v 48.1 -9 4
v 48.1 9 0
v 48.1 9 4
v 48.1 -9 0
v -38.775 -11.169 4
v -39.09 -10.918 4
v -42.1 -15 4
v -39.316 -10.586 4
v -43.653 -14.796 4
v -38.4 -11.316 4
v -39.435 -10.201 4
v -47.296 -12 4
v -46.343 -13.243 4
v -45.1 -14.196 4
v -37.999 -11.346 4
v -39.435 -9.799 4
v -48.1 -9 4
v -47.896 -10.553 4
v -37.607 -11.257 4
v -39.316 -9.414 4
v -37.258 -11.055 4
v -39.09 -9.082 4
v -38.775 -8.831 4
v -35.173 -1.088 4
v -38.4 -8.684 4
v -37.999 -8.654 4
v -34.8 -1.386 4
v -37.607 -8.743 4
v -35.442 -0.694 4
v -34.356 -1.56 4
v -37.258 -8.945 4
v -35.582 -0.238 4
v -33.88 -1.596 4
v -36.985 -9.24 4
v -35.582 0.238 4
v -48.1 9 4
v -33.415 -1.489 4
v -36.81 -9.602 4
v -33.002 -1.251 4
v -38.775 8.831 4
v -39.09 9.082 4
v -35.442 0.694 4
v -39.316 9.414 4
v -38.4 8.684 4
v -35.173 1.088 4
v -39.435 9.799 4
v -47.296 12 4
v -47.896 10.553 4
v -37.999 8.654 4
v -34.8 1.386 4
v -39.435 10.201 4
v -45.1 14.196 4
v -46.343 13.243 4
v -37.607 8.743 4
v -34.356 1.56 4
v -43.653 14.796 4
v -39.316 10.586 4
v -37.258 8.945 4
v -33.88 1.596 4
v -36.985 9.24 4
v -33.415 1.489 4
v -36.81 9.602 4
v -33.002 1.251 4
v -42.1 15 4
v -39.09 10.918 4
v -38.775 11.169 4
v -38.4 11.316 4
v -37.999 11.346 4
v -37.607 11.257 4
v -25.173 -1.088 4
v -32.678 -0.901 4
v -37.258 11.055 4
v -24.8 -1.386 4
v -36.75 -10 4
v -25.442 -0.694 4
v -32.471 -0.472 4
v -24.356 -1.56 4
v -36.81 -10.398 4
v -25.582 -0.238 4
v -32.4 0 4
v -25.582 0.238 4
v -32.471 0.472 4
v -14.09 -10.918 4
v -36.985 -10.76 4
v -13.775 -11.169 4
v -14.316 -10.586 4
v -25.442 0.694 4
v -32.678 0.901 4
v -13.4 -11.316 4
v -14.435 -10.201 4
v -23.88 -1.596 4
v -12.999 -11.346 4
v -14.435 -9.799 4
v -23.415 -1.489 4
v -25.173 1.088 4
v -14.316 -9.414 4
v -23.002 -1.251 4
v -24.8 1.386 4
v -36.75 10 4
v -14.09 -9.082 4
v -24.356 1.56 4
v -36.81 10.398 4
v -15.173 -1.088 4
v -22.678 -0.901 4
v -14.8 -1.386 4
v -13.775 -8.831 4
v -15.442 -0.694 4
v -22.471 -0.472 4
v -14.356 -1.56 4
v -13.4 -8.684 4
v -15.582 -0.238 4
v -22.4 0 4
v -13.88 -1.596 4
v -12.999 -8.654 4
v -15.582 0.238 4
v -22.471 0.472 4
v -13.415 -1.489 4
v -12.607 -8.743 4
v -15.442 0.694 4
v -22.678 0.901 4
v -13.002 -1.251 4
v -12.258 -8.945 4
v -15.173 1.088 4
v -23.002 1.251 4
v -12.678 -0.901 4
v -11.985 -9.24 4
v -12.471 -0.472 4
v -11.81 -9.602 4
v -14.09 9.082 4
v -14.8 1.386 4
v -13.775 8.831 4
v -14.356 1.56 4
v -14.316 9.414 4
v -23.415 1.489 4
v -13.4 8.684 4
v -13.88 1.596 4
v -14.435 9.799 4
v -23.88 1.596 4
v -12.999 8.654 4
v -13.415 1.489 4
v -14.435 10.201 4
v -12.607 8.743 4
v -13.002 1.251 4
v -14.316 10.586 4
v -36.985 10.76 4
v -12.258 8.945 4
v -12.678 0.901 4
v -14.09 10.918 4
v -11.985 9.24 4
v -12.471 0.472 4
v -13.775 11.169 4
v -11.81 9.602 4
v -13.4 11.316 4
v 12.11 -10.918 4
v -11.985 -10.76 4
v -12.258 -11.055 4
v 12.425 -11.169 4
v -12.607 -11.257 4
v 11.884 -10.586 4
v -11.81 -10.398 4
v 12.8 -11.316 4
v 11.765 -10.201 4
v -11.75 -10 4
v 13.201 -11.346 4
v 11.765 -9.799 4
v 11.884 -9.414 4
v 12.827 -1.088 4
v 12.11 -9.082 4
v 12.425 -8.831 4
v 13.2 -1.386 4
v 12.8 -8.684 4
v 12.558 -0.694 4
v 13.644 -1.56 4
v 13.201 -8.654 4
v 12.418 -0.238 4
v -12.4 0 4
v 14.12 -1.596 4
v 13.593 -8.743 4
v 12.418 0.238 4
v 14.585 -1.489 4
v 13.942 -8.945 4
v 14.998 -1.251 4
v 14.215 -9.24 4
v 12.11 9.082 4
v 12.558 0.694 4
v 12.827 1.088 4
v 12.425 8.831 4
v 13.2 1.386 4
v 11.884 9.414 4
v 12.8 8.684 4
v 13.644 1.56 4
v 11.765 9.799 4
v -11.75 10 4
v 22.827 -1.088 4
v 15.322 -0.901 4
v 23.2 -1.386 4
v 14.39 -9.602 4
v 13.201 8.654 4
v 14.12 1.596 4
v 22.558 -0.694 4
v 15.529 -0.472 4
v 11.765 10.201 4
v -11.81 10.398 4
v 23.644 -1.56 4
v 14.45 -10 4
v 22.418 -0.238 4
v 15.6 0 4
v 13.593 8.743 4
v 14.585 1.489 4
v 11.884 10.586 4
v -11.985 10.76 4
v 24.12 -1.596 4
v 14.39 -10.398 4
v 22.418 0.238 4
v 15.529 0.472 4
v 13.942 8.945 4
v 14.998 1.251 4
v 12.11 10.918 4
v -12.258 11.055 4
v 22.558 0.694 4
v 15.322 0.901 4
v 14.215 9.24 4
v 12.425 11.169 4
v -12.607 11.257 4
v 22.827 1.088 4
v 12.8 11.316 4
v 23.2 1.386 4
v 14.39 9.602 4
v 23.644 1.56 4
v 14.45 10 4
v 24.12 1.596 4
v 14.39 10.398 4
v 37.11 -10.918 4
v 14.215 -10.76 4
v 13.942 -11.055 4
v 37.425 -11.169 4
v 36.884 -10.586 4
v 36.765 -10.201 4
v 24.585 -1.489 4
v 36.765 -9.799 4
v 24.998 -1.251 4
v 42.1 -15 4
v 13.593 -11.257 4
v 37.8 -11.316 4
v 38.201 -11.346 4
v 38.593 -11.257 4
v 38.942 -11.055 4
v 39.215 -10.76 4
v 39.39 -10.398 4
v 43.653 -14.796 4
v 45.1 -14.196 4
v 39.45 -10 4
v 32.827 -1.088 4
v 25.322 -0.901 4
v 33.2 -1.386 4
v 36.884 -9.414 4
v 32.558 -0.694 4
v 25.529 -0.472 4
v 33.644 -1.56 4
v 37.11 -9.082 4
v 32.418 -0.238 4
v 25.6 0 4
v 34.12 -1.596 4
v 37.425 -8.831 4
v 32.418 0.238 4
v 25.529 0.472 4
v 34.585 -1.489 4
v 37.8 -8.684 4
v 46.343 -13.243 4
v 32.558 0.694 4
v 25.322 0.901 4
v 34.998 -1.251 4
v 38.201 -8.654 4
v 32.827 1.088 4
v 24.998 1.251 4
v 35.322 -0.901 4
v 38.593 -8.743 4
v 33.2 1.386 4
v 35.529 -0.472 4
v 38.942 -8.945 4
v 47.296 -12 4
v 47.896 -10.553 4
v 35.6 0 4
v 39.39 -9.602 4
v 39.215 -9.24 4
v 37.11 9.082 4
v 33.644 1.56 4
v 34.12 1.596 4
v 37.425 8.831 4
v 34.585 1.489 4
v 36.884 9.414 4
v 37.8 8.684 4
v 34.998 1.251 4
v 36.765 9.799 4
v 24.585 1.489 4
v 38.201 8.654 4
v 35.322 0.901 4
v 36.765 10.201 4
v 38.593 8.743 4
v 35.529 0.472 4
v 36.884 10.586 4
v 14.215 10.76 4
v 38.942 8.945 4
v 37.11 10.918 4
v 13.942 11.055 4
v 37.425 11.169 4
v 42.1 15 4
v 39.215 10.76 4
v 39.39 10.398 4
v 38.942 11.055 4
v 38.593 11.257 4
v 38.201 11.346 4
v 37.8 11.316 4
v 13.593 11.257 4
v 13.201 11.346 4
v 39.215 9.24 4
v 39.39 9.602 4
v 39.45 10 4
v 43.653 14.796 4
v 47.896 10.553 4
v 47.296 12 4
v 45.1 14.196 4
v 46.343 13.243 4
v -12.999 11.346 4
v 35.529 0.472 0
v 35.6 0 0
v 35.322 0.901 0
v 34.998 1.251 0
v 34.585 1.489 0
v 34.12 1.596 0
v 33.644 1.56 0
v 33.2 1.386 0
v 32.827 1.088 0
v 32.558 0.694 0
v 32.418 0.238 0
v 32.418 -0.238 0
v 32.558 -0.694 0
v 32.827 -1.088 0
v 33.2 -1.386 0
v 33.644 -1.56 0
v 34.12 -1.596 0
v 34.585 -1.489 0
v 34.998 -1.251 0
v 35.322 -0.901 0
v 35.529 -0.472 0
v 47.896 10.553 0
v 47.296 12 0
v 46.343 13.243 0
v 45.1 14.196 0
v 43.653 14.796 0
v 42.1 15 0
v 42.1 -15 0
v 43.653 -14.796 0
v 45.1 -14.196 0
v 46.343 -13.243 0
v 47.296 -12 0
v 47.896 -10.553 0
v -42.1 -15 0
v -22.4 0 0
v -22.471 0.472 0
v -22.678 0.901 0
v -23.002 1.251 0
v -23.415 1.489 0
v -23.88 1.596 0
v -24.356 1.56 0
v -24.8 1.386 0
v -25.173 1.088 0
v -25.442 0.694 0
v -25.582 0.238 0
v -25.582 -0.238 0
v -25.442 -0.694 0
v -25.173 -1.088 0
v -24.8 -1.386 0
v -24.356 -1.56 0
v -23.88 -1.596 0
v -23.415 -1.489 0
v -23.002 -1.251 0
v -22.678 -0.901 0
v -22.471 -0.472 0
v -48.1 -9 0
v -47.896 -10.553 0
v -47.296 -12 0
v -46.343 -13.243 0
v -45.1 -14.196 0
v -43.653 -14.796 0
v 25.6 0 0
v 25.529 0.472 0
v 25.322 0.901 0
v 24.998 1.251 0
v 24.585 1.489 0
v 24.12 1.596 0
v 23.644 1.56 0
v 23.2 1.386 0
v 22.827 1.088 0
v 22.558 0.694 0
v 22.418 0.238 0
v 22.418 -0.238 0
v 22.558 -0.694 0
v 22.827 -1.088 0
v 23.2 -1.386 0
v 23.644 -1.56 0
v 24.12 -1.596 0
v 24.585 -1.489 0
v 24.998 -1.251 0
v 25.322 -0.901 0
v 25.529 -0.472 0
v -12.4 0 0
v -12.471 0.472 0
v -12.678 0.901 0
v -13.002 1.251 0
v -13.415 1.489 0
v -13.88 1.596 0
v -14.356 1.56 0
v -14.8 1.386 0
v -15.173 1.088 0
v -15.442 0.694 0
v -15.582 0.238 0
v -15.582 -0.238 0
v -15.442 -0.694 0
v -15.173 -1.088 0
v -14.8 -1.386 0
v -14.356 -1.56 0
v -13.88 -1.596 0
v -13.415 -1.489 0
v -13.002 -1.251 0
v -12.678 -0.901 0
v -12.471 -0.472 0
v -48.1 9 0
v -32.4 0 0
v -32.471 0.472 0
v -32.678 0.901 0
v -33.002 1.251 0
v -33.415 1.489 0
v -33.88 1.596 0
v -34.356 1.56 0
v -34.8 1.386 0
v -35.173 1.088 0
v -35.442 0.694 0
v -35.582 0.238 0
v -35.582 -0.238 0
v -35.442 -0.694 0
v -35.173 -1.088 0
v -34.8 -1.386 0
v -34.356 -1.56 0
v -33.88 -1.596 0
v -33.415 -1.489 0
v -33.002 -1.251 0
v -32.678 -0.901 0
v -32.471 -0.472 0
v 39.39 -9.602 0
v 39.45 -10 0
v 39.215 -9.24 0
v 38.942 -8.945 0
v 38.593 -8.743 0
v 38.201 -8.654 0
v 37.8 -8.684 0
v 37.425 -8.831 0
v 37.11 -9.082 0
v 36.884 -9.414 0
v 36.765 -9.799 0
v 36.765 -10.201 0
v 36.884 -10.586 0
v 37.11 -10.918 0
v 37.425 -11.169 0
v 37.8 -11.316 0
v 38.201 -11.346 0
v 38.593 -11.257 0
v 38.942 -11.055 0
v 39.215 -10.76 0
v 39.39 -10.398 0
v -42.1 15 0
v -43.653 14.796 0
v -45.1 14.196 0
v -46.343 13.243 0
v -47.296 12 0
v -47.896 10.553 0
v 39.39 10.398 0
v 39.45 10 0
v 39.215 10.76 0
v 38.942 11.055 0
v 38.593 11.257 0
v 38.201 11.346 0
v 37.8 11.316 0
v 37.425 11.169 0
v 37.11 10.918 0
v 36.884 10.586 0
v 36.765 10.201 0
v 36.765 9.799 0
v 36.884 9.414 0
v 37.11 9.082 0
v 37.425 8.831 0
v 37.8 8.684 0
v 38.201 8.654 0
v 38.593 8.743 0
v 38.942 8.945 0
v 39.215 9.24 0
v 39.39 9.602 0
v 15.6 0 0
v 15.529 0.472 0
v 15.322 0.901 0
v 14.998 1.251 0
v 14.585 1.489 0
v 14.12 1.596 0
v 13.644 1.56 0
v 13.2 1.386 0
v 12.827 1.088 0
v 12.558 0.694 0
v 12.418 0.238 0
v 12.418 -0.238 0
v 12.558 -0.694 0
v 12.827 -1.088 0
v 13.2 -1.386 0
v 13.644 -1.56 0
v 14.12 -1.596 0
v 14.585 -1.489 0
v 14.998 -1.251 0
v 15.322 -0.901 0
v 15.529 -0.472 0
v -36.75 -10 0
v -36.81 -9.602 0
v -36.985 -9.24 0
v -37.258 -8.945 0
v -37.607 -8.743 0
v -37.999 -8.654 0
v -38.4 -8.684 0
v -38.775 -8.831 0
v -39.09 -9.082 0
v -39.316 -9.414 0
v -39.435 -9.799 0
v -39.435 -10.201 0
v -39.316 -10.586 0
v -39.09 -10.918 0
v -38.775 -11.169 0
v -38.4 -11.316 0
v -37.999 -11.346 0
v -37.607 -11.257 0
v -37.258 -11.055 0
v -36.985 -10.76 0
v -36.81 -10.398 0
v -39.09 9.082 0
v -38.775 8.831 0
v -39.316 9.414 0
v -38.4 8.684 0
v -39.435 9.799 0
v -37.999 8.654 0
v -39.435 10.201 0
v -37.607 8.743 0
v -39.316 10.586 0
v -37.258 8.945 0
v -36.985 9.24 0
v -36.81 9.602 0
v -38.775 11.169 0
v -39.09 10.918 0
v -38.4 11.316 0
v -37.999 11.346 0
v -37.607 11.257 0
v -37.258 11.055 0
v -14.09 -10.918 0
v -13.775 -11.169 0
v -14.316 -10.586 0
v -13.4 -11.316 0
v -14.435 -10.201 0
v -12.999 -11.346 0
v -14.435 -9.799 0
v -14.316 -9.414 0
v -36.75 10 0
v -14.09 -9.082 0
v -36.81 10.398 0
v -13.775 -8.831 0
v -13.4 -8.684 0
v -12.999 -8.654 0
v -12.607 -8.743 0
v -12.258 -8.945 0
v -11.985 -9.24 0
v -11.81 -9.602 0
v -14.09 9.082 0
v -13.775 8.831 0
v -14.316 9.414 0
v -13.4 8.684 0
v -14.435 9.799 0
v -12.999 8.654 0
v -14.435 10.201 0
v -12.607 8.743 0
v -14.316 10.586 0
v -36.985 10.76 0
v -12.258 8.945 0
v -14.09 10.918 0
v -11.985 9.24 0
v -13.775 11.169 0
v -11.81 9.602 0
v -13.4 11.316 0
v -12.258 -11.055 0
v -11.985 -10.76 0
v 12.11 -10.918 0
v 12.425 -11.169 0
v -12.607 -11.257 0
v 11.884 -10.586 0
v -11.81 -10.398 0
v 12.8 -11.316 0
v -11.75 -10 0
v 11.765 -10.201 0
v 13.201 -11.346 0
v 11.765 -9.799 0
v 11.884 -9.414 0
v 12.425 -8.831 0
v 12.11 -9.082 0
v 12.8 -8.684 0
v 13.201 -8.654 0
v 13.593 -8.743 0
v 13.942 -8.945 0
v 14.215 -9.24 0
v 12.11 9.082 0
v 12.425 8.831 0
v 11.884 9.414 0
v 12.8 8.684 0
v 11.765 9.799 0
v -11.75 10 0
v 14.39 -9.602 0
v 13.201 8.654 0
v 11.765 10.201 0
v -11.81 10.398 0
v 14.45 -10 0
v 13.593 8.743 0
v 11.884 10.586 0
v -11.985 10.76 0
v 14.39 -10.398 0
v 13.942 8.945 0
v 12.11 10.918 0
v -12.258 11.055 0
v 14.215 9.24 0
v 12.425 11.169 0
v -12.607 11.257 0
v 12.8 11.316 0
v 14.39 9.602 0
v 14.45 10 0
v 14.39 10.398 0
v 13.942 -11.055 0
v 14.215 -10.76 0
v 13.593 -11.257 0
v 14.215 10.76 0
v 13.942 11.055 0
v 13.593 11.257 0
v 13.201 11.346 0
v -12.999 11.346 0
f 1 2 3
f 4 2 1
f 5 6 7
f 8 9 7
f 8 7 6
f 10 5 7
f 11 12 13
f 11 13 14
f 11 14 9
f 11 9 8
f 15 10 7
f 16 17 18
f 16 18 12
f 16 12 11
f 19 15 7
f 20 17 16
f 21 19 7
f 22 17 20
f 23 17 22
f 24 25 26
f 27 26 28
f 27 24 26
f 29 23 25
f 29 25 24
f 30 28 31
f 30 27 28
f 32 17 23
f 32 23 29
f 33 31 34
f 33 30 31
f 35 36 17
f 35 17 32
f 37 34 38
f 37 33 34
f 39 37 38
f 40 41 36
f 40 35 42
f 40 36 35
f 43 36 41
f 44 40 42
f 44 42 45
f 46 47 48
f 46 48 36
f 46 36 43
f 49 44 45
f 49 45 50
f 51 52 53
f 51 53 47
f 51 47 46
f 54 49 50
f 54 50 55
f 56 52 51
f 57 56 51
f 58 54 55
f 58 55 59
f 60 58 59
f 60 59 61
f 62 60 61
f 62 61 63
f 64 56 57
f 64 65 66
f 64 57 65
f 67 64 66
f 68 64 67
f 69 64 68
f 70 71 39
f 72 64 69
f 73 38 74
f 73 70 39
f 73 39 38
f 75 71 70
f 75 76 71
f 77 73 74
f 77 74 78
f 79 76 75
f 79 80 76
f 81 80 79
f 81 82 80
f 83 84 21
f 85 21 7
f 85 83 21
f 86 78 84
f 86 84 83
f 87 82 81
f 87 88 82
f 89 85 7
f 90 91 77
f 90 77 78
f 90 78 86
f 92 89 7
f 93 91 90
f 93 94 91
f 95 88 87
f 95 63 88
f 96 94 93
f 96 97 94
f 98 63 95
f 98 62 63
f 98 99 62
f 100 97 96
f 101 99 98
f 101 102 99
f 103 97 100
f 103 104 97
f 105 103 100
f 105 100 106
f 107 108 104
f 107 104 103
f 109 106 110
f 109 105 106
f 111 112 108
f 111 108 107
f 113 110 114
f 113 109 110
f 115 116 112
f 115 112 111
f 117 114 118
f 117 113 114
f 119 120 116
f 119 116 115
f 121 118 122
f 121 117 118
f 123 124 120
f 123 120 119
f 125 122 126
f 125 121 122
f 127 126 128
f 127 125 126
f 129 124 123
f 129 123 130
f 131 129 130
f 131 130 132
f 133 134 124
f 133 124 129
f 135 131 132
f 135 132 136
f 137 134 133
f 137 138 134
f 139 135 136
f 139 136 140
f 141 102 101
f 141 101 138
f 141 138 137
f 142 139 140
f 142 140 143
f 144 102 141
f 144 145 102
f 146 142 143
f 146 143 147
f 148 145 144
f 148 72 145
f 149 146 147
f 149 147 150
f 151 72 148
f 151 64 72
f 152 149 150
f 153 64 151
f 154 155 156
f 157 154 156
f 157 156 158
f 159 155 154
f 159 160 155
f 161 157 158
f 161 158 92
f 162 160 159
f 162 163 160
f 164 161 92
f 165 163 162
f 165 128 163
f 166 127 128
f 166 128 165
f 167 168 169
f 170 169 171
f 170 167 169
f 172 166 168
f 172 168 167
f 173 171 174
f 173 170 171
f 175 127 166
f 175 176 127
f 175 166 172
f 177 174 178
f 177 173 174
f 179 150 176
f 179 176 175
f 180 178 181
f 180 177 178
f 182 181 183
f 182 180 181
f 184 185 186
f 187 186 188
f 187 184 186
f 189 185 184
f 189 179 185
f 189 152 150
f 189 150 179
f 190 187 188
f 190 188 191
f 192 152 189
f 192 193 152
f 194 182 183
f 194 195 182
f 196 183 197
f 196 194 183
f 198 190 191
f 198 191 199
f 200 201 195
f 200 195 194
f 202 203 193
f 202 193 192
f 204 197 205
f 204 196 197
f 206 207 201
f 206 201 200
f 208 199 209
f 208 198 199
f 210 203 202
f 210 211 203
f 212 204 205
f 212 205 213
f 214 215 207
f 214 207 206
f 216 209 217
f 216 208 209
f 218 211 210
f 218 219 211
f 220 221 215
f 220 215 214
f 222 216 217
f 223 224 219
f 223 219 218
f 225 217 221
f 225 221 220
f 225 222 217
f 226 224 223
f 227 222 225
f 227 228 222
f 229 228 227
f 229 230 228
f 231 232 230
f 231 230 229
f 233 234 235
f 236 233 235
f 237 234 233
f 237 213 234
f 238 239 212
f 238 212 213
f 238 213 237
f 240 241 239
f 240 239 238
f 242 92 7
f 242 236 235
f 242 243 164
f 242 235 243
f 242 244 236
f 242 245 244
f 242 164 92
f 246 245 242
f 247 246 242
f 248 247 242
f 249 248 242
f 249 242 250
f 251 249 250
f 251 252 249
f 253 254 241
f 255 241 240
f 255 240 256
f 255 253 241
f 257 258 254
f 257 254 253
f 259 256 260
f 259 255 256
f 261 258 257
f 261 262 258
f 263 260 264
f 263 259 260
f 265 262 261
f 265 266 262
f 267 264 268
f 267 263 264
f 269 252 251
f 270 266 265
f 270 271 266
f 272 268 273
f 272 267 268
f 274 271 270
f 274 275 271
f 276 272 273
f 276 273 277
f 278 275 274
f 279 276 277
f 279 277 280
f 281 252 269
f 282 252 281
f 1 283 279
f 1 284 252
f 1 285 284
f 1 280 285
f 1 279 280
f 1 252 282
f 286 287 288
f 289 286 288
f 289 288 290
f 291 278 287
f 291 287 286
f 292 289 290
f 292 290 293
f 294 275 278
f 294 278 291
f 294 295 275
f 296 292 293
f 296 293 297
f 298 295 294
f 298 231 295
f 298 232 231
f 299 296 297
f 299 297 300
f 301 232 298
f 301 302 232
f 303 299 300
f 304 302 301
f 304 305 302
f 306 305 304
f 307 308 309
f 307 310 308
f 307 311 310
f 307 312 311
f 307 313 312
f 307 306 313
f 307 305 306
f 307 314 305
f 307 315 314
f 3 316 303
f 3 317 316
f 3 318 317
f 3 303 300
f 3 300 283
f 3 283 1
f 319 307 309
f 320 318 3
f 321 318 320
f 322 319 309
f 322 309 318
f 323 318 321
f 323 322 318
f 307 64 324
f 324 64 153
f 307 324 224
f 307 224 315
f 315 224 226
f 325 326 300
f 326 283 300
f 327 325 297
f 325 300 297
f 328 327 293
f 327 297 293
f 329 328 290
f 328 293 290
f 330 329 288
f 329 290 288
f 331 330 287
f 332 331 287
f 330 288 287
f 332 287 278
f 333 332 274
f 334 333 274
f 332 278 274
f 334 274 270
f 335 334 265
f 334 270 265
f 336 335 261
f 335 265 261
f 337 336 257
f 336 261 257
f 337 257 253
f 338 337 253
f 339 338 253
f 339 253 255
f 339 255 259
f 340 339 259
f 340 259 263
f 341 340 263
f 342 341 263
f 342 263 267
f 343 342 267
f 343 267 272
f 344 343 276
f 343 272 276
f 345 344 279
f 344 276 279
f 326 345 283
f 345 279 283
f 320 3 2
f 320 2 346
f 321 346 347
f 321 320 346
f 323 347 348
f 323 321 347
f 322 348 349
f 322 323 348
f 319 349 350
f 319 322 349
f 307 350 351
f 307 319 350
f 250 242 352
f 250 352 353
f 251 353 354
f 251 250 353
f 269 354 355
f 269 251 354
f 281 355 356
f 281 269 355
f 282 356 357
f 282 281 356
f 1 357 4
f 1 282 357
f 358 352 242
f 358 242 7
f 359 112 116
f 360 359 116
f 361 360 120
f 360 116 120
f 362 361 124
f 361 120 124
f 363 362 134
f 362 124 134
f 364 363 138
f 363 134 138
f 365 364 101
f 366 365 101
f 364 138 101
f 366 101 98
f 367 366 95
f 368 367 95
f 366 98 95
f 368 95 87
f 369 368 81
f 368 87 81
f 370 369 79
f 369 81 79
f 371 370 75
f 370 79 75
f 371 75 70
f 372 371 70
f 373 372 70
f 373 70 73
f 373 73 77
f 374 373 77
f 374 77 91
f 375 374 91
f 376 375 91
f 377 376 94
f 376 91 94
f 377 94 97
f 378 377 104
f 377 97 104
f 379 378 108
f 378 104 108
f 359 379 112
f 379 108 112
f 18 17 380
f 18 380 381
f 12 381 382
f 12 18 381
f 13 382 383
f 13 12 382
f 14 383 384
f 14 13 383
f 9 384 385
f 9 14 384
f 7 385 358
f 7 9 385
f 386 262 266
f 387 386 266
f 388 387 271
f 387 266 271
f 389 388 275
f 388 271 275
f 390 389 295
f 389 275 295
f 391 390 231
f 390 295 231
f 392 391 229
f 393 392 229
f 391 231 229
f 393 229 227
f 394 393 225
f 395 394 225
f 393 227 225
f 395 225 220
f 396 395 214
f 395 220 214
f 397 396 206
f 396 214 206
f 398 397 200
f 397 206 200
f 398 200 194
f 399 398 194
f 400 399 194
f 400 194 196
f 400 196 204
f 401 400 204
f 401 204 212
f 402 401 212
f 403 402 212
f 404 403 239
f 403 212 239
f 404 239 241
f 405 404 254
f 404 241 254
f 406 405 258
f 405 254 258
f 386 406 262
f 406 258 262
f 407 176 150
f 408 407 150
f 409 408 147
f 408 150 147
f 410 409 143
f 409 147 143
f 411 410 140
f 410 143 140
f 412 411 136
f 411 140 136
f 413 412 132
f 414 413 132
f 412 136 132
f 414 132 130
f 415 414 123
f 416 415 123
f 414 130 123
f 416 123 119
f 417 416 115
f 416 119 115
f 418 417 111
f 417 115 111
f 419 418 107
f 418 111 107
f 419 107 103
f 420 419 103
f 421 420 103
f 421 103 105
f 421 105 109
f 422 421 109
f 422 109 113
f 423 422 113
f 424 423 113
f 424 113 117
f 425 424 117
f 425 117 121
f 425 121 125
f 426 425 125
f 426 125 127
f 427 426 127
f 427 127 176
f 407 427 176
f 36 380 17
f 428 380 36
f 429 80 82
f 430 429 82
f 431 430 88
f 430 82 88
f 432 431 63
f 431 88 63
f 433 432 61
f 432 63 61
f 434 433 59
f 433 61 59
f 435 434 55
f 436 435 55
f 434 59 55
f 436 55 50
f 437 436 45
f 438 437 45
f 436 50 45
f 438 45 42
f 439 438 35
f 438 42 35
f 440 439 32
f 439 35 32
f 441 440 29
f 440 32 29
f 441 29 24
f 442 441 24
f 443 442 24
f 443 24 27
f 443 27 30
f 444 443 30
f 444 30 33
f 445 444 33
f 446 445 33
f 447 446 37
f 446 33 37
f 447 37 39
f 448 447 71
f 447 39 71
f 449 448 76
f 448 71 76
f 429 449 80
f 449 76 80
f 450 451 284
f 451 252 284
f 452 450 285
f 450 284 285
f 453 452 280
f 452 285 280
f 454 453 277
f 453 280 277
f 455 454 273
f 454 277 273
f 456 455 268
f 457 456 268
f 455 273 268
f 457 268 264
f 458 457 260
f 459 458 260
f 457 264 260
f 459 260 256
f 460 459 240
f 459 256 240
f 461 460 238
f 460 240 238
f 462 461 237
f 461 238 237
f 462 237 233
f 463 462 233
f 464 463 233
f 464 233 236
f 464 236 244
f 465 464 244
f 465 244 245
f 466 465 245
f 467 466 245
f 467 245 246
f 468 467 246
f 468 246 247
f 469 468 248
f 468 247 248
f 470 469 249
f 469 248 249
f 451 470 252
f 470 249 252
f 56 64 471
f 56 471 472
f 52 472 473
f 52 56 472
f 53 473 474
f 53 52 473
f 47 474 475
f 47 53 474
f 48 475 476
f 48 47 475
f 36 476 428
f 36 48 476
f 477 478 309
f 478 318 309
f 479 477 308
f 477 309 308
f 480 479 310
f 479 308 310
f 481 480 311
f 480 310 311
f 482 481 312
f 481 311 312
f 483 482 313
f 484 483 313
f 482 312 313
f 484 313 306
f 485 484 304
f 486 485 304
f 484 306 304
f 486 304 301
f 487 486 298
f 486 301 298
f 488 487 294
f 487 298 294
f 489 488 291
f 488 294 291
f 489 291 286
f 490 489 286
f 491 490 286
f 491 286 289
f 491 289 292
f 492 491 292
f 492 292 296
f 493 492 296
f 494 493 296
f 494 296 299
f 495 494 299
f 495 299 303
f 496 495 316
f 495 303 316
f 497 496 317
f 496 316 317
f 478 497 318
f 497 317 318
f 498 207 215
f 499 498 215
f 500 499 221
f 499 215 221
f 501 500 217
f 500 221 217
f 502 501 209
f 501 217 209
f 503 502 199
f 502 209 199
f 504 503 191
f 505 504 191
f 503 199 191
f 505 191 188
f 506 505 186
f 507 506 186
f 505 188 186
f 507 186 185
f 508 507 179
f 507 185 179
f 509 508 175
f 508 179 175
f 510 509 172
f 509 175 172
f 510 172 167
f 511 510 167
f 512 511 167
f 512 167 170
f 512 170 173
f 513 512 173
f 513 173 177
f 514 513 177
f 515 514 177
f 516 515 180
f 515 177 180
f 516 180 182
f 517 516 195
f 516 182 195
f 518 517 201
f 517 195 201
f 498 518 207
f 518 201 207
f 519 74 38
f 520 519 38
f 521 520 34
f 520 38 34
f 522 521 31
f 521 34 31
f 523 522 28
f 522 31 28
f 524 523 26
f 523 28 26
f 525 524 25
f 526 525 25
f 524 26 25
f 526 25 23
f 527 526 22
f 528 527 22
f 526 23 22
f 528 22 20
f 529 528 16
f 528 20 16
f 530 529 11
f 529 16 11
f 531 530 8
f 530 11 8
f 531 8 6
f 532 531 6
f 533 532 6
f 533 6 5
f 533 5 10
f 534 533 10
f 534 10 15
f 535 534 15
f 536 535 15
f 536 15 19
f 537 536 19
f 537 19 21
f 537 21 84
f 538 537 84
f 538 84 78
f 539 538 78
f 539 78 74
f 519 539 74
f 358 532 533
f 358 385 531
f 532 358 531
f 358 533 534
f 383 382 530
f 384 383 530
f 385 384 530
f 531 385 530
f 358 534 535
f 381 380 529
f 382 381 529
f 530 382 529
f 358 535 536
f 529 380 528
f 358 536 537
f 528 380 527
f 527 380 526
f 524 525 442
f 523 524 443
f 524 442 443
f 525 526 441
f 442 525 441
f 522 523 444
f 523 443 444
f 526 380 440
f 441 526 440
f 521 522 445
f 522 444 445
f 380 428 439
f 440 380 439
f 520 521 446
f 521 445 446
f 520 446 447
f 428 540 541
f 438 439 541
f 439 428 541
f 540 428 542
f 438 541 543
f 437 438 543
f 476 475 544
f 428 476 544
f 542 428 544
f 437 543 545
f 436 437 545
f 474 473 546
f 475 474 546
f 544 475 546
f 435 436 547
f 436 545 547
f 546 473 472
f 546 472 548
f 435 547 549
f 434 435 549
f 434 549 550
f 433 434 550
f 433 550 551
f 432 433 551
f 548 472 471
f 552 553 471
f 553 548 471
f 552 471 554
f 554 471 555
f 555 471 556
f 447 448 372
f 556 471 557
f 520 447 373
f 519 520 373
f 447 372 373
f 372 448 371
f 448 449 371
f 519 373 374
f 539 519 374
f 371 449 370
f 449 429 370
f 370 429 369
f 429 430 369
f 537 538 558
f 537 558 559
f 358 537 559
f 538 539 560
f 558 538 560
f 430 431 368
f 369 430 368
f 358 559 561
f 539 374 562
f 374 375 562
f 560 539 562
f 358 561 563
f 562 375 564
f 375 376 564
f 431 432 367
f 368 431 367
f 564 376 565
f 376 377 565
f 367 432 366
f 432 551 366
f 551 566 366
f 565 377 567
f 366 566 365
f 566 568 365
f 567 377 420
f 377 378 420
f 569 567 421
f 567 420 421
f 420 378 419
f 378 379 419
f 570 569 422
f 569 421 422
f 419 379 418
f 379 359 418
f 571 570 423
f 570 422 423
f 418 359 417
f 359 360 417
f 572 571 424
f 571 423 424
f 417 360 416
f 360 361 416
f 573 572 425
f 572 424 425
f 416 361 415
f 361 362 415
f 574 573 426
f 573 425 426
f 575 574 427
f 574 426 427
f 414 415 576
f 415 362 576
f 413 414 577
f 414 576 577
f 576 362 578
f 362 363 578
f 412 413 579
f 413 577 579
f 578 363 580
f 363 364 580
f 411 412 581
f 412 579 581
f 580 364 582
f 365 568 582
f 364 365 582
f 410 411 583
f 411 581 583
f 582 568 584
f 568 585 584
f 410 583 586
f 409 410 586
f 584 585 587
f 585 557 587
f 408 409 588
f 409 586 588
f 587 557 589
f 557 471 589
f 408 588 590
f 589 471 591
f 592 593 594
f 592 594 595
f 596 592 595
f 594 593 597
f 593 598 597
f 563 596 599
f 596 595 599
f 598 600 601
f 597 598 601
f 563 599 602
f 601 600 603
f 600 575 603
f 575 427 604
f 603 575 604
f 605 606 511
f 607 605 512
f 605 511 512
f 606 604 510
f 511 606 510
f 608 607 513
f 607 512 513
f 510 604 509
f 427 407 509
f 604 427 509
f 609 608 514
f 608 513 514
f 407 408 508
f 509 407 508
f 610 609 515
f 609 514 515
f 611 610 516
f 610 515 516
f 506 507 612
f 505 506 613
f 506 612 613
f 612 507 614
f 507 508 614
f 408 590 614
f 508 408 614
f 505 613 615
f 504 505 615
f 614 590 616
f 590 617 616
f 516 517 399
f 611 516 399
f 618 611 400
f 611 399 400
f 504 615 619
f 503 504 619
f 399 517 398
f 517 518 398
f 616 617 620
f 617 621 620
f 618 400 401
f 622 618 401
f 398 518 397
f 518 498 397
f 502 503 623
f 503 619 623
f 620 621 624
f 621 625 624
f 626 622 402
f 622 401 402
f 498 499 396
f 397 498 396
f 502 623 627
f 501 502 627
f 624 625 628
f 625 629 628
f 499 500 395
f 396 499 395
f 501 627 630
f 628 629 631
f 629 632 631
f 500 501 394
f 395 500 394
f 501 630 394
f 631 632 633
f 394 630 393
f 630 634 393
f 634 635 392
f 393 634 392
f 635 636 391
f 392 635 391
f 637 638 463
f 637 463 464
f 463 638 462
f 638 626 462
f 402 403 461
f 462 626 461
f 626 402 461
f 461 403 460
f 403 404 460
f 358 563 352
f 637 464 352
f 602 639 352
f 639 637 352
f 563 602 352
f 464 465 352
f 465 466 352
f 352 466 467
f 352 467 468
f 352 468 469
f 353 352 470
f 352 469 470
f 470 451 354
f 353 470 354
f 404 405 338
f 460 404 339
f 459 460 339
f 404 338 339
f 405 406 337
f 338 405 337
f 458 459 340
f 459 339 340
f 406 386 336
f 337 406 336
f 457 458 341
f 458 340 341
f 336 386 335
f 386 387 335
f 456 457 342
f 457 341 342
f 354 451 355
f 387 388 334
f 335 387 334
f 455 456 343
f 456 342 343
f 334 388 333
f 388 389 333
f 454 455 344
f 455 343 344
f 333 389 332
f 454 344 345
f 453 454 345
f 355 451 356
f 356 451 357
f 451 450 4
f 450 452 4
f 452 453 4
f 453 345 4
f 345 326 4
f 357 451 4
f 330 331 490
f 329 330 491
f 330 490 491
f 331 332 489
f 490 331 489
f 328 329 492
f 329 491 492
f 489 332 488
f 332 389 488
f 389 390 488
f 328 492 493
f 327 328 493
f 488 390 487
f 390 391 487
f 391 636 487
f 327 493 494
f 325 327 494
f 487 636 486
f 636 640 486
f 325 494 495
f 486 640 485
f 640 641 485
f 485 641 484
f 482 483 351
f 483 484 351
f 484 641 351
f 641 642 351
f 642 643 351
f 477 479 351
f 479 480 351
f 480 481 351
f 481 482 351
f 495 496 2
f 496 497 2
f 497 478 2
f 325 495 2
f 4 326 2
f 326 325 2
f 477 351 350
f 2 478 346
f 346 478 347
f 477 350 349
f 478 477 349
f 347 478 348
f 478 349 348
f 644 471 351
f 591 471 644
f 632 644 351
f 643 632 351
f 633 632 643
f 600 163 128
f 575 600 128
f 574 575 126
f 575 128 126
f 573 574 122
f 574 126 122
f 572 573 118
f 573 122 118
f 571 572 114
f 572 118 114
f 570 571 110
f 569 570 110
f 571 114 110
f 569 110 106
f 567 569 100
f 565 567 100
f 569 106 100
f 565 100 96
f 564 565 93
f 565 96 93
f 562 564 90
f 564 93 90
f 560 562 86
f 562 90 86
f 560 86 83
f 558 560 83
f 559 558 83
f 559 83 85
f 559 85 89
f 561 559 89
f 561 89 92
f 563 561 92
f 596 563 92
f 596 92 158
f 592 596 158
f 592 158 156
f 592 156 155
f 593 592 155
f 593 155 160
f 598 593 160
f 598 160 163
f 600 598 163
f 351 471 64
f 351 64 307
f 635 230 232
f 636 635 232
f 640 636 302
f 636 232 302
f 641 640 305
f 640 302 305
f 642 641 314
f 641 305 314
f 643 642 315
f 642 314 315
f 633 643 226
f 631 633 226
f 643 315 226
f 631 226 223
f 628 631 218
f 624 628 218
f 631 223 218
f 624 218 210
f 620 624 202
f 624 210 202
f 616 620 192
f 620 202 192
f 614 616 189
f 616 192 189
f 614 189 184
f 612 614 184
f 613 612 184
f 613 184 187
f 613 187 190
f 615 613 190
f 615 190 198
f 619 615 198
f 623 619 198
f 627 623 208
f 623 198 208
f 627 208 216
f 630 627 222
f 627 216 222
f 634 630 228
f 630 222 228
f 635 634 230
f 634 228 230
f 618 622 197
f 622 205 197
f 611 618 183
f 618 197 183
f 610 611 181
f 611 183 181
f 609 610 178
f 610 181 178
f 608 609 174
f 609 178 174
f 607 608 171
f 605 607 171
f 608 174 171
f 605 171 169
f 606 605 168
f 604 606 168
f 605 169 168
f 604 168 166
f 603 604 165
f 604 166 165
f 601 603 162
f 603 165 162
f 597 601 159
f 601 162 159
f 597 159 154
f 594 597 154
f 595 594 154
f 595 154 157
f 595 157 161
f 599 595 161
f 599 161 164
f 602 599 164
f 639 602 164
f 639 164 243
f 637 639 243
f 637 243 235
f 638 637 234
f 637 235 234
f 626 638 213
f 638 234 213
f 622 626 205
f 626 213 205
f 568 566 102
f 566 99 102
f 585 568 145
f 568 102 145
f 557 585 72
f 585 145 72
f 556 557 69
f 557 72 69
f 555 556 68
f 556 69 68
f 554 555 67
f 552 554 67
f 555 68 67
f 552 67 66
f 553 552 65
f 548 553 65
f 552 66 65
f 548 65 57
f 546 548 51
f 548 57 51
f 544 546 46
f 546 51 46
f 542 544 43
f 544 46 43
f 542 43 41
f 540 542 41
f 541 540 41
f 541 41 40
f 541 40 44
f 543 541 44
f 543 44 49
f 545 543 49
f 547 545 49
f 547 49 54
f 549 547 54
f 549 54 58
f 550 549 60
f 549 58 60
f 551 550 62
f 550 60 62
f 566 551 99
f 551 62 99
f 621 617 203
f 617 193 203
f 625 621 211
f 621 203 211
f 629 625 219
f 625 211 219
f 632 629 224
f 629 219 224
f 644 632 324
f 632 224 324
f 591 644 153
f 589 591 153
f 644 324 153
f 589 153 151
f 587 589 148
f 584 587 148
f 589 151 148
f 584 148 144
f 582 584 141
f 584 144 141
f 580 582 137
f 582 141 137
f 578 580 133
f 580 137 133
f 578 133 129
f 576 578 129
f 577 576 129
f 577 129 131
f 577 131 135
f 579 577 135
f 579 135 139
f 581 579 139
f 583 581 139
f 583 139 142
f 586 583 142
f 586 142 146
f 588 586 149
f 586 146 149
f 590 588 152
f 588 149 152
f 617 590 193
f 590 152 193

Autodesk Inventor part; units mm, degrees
ref_plane "YZ Plane" through (0, 0, 0) normal (1, 0, 0) x (0, 1, 0)
ref_plane "XZ Plane" through (0, 0, 0) normal (0, 1, 0) x (-1, 0, 0)
ref_plane "XY Plane" through (0, 0, 0) normal (0, 0, 1) x (1, 0, 0)
sketch "스케치1" plane through (0, 0, 0) normal (0, 0, 1) x (1, 0, 0)
  line L0 (-48.1, 15) -> (48.1, 15)
  line L1 (48.1, 15) -> (48.1, -15)
  line L2 (48.1, -15) -> (-48.1, -15)
  line L3 (-48.1, -15) -> (-48.1, 15)
  line L4 (-48.1, 15) -> (48.1, -15) construction
  line L5 (48.1, 15) -> (-48.1, -15) construction
  point P0 (0, 0)
  dimension "d0" = 96.2
  dimension "d1" = 30
extrude "돌출1" add sketch "스케치1" along normal blind 4
sketch "스케치2" plane through (0, 0, 4) normal (0, 0, 1) x (1, 0, 0)
  line L0 (-48.1, 15) -> (-48.1, -15) projected
  line L1 (-48.1, 0) -> (48.1, 0) construction
  line L2 (48.1, -15) -> (48.1, 15) projected
  circle A0 centre (-24, 0) radius 1.6
  circle A1 centre (-34, 0) radius 1.6
  circle A2 centre (14, 0) radius 1.6
  circle A3 centre (24, 0) radius 1.6
  circle A4 centre (34, 0) radius 1.6
  circle A5 centre (-14, 0) radius 1.6
  point P0 (0, 0)
  point P1 (0, 0)
  dimension "d5" = 3.2
  dimension "d6" = 3.2
  dimension "d7" = 3.2
  dimension "d8" = 3.2
  dimension "d9" = 14
  dimension "d10" = 10
  dimension "d11" = 3.2
  dimension "d12" = 3.2
  dimension "d13" = 10
  dimension "d14" = 14
  dimension "d15" = 10
  dimension "d16" = 10
extrude "돌출2" cut sketch "스케치2" against normal blind 4
fillet "모깎기1" radius 6 4 edges at (-48.1, 15, 2) (-48.1, -15, 2) (48.1, -15, 2) (48.1, 15, 2)
sketch "스케치3" plane through (0, 0, 4) normal (0, 0, 1) x (1, 0, 0)
  arc A0 (48.1, 9) -> (42.1, 15) centre (42.1, 9) ccw projected
  line L0 (42.1, 15) -> (-42.1, 15) projected
  arc A1 (-42.1, 15) -> (-48.1, 9) centre (-42.1, 9) ccw projected
  line L1 (-48.1, 9) -> (-48.1, -9) projected
  arc A2 (-48.1, -9) -> (-42.1, -15) centre (-42.1, -9) ccw projected
  line L2 (-42.1, -15) -> (42.1, -15) projected
  arc A3 (42.1, -15) -> (48.1, -9) centre (42.1, -9) ccw projected
  line L3 (48.1, -9) -> (48.1, 9) projected
  circle A4 centre (-14, 0) radius 1.6 projected
  circle A5 centre (34, 0) radius 1.6 projected
  circle A6 centre (-24, 0) radius 1.6 projected
  circle A7 centre (14, 0) radius 1.6 projected
  circle A8 centre (24, 0) radius 1.6 projected
  circle A9 centre (-34, 0) radius 1.6 projected
  circle A10 centre (-38.1, 10) radius 1.35
  circle A11 centre (-13.1, 10) radius 1.35
  circle A12 centre (-38.1, -10) radius 1.35
  circle A13 centre (-13.1, -10) radius 1.35
  line L4 (0, 0) -> (0, 15)
  line L5 (42.1, 15) -> (-42.1, 15) projected
  line L6 (48.1, 9) -> (48.1, -9)
  circle A14 centre (38.1, 10) radius 1.35
  circle A15 centre (13.1, 10) radius 1.35
  circle A16 centre (38.1, -10) radius 1.35
  circle A17 centre (13.1, -10) radius 1.35
  dimension "d20" = 2.7
  dimension "d21" = 2.7
  dimension "d22" = 2.7
  dimension "d23" = 2.7
  dimension "d24" = 25
  dimension "d25" = 25
  dimension "d26" = 20
  dimension "d27" = 10
  dimension "d28" = 10
extrude "돌출3" cut sketch "스케치3" against normal blind 4 contours A10 | A11 | A12 | A13 | A14 | A15 | A16 | A17
properties part number "lm가이드가이드" material "알루미늄 6061"
